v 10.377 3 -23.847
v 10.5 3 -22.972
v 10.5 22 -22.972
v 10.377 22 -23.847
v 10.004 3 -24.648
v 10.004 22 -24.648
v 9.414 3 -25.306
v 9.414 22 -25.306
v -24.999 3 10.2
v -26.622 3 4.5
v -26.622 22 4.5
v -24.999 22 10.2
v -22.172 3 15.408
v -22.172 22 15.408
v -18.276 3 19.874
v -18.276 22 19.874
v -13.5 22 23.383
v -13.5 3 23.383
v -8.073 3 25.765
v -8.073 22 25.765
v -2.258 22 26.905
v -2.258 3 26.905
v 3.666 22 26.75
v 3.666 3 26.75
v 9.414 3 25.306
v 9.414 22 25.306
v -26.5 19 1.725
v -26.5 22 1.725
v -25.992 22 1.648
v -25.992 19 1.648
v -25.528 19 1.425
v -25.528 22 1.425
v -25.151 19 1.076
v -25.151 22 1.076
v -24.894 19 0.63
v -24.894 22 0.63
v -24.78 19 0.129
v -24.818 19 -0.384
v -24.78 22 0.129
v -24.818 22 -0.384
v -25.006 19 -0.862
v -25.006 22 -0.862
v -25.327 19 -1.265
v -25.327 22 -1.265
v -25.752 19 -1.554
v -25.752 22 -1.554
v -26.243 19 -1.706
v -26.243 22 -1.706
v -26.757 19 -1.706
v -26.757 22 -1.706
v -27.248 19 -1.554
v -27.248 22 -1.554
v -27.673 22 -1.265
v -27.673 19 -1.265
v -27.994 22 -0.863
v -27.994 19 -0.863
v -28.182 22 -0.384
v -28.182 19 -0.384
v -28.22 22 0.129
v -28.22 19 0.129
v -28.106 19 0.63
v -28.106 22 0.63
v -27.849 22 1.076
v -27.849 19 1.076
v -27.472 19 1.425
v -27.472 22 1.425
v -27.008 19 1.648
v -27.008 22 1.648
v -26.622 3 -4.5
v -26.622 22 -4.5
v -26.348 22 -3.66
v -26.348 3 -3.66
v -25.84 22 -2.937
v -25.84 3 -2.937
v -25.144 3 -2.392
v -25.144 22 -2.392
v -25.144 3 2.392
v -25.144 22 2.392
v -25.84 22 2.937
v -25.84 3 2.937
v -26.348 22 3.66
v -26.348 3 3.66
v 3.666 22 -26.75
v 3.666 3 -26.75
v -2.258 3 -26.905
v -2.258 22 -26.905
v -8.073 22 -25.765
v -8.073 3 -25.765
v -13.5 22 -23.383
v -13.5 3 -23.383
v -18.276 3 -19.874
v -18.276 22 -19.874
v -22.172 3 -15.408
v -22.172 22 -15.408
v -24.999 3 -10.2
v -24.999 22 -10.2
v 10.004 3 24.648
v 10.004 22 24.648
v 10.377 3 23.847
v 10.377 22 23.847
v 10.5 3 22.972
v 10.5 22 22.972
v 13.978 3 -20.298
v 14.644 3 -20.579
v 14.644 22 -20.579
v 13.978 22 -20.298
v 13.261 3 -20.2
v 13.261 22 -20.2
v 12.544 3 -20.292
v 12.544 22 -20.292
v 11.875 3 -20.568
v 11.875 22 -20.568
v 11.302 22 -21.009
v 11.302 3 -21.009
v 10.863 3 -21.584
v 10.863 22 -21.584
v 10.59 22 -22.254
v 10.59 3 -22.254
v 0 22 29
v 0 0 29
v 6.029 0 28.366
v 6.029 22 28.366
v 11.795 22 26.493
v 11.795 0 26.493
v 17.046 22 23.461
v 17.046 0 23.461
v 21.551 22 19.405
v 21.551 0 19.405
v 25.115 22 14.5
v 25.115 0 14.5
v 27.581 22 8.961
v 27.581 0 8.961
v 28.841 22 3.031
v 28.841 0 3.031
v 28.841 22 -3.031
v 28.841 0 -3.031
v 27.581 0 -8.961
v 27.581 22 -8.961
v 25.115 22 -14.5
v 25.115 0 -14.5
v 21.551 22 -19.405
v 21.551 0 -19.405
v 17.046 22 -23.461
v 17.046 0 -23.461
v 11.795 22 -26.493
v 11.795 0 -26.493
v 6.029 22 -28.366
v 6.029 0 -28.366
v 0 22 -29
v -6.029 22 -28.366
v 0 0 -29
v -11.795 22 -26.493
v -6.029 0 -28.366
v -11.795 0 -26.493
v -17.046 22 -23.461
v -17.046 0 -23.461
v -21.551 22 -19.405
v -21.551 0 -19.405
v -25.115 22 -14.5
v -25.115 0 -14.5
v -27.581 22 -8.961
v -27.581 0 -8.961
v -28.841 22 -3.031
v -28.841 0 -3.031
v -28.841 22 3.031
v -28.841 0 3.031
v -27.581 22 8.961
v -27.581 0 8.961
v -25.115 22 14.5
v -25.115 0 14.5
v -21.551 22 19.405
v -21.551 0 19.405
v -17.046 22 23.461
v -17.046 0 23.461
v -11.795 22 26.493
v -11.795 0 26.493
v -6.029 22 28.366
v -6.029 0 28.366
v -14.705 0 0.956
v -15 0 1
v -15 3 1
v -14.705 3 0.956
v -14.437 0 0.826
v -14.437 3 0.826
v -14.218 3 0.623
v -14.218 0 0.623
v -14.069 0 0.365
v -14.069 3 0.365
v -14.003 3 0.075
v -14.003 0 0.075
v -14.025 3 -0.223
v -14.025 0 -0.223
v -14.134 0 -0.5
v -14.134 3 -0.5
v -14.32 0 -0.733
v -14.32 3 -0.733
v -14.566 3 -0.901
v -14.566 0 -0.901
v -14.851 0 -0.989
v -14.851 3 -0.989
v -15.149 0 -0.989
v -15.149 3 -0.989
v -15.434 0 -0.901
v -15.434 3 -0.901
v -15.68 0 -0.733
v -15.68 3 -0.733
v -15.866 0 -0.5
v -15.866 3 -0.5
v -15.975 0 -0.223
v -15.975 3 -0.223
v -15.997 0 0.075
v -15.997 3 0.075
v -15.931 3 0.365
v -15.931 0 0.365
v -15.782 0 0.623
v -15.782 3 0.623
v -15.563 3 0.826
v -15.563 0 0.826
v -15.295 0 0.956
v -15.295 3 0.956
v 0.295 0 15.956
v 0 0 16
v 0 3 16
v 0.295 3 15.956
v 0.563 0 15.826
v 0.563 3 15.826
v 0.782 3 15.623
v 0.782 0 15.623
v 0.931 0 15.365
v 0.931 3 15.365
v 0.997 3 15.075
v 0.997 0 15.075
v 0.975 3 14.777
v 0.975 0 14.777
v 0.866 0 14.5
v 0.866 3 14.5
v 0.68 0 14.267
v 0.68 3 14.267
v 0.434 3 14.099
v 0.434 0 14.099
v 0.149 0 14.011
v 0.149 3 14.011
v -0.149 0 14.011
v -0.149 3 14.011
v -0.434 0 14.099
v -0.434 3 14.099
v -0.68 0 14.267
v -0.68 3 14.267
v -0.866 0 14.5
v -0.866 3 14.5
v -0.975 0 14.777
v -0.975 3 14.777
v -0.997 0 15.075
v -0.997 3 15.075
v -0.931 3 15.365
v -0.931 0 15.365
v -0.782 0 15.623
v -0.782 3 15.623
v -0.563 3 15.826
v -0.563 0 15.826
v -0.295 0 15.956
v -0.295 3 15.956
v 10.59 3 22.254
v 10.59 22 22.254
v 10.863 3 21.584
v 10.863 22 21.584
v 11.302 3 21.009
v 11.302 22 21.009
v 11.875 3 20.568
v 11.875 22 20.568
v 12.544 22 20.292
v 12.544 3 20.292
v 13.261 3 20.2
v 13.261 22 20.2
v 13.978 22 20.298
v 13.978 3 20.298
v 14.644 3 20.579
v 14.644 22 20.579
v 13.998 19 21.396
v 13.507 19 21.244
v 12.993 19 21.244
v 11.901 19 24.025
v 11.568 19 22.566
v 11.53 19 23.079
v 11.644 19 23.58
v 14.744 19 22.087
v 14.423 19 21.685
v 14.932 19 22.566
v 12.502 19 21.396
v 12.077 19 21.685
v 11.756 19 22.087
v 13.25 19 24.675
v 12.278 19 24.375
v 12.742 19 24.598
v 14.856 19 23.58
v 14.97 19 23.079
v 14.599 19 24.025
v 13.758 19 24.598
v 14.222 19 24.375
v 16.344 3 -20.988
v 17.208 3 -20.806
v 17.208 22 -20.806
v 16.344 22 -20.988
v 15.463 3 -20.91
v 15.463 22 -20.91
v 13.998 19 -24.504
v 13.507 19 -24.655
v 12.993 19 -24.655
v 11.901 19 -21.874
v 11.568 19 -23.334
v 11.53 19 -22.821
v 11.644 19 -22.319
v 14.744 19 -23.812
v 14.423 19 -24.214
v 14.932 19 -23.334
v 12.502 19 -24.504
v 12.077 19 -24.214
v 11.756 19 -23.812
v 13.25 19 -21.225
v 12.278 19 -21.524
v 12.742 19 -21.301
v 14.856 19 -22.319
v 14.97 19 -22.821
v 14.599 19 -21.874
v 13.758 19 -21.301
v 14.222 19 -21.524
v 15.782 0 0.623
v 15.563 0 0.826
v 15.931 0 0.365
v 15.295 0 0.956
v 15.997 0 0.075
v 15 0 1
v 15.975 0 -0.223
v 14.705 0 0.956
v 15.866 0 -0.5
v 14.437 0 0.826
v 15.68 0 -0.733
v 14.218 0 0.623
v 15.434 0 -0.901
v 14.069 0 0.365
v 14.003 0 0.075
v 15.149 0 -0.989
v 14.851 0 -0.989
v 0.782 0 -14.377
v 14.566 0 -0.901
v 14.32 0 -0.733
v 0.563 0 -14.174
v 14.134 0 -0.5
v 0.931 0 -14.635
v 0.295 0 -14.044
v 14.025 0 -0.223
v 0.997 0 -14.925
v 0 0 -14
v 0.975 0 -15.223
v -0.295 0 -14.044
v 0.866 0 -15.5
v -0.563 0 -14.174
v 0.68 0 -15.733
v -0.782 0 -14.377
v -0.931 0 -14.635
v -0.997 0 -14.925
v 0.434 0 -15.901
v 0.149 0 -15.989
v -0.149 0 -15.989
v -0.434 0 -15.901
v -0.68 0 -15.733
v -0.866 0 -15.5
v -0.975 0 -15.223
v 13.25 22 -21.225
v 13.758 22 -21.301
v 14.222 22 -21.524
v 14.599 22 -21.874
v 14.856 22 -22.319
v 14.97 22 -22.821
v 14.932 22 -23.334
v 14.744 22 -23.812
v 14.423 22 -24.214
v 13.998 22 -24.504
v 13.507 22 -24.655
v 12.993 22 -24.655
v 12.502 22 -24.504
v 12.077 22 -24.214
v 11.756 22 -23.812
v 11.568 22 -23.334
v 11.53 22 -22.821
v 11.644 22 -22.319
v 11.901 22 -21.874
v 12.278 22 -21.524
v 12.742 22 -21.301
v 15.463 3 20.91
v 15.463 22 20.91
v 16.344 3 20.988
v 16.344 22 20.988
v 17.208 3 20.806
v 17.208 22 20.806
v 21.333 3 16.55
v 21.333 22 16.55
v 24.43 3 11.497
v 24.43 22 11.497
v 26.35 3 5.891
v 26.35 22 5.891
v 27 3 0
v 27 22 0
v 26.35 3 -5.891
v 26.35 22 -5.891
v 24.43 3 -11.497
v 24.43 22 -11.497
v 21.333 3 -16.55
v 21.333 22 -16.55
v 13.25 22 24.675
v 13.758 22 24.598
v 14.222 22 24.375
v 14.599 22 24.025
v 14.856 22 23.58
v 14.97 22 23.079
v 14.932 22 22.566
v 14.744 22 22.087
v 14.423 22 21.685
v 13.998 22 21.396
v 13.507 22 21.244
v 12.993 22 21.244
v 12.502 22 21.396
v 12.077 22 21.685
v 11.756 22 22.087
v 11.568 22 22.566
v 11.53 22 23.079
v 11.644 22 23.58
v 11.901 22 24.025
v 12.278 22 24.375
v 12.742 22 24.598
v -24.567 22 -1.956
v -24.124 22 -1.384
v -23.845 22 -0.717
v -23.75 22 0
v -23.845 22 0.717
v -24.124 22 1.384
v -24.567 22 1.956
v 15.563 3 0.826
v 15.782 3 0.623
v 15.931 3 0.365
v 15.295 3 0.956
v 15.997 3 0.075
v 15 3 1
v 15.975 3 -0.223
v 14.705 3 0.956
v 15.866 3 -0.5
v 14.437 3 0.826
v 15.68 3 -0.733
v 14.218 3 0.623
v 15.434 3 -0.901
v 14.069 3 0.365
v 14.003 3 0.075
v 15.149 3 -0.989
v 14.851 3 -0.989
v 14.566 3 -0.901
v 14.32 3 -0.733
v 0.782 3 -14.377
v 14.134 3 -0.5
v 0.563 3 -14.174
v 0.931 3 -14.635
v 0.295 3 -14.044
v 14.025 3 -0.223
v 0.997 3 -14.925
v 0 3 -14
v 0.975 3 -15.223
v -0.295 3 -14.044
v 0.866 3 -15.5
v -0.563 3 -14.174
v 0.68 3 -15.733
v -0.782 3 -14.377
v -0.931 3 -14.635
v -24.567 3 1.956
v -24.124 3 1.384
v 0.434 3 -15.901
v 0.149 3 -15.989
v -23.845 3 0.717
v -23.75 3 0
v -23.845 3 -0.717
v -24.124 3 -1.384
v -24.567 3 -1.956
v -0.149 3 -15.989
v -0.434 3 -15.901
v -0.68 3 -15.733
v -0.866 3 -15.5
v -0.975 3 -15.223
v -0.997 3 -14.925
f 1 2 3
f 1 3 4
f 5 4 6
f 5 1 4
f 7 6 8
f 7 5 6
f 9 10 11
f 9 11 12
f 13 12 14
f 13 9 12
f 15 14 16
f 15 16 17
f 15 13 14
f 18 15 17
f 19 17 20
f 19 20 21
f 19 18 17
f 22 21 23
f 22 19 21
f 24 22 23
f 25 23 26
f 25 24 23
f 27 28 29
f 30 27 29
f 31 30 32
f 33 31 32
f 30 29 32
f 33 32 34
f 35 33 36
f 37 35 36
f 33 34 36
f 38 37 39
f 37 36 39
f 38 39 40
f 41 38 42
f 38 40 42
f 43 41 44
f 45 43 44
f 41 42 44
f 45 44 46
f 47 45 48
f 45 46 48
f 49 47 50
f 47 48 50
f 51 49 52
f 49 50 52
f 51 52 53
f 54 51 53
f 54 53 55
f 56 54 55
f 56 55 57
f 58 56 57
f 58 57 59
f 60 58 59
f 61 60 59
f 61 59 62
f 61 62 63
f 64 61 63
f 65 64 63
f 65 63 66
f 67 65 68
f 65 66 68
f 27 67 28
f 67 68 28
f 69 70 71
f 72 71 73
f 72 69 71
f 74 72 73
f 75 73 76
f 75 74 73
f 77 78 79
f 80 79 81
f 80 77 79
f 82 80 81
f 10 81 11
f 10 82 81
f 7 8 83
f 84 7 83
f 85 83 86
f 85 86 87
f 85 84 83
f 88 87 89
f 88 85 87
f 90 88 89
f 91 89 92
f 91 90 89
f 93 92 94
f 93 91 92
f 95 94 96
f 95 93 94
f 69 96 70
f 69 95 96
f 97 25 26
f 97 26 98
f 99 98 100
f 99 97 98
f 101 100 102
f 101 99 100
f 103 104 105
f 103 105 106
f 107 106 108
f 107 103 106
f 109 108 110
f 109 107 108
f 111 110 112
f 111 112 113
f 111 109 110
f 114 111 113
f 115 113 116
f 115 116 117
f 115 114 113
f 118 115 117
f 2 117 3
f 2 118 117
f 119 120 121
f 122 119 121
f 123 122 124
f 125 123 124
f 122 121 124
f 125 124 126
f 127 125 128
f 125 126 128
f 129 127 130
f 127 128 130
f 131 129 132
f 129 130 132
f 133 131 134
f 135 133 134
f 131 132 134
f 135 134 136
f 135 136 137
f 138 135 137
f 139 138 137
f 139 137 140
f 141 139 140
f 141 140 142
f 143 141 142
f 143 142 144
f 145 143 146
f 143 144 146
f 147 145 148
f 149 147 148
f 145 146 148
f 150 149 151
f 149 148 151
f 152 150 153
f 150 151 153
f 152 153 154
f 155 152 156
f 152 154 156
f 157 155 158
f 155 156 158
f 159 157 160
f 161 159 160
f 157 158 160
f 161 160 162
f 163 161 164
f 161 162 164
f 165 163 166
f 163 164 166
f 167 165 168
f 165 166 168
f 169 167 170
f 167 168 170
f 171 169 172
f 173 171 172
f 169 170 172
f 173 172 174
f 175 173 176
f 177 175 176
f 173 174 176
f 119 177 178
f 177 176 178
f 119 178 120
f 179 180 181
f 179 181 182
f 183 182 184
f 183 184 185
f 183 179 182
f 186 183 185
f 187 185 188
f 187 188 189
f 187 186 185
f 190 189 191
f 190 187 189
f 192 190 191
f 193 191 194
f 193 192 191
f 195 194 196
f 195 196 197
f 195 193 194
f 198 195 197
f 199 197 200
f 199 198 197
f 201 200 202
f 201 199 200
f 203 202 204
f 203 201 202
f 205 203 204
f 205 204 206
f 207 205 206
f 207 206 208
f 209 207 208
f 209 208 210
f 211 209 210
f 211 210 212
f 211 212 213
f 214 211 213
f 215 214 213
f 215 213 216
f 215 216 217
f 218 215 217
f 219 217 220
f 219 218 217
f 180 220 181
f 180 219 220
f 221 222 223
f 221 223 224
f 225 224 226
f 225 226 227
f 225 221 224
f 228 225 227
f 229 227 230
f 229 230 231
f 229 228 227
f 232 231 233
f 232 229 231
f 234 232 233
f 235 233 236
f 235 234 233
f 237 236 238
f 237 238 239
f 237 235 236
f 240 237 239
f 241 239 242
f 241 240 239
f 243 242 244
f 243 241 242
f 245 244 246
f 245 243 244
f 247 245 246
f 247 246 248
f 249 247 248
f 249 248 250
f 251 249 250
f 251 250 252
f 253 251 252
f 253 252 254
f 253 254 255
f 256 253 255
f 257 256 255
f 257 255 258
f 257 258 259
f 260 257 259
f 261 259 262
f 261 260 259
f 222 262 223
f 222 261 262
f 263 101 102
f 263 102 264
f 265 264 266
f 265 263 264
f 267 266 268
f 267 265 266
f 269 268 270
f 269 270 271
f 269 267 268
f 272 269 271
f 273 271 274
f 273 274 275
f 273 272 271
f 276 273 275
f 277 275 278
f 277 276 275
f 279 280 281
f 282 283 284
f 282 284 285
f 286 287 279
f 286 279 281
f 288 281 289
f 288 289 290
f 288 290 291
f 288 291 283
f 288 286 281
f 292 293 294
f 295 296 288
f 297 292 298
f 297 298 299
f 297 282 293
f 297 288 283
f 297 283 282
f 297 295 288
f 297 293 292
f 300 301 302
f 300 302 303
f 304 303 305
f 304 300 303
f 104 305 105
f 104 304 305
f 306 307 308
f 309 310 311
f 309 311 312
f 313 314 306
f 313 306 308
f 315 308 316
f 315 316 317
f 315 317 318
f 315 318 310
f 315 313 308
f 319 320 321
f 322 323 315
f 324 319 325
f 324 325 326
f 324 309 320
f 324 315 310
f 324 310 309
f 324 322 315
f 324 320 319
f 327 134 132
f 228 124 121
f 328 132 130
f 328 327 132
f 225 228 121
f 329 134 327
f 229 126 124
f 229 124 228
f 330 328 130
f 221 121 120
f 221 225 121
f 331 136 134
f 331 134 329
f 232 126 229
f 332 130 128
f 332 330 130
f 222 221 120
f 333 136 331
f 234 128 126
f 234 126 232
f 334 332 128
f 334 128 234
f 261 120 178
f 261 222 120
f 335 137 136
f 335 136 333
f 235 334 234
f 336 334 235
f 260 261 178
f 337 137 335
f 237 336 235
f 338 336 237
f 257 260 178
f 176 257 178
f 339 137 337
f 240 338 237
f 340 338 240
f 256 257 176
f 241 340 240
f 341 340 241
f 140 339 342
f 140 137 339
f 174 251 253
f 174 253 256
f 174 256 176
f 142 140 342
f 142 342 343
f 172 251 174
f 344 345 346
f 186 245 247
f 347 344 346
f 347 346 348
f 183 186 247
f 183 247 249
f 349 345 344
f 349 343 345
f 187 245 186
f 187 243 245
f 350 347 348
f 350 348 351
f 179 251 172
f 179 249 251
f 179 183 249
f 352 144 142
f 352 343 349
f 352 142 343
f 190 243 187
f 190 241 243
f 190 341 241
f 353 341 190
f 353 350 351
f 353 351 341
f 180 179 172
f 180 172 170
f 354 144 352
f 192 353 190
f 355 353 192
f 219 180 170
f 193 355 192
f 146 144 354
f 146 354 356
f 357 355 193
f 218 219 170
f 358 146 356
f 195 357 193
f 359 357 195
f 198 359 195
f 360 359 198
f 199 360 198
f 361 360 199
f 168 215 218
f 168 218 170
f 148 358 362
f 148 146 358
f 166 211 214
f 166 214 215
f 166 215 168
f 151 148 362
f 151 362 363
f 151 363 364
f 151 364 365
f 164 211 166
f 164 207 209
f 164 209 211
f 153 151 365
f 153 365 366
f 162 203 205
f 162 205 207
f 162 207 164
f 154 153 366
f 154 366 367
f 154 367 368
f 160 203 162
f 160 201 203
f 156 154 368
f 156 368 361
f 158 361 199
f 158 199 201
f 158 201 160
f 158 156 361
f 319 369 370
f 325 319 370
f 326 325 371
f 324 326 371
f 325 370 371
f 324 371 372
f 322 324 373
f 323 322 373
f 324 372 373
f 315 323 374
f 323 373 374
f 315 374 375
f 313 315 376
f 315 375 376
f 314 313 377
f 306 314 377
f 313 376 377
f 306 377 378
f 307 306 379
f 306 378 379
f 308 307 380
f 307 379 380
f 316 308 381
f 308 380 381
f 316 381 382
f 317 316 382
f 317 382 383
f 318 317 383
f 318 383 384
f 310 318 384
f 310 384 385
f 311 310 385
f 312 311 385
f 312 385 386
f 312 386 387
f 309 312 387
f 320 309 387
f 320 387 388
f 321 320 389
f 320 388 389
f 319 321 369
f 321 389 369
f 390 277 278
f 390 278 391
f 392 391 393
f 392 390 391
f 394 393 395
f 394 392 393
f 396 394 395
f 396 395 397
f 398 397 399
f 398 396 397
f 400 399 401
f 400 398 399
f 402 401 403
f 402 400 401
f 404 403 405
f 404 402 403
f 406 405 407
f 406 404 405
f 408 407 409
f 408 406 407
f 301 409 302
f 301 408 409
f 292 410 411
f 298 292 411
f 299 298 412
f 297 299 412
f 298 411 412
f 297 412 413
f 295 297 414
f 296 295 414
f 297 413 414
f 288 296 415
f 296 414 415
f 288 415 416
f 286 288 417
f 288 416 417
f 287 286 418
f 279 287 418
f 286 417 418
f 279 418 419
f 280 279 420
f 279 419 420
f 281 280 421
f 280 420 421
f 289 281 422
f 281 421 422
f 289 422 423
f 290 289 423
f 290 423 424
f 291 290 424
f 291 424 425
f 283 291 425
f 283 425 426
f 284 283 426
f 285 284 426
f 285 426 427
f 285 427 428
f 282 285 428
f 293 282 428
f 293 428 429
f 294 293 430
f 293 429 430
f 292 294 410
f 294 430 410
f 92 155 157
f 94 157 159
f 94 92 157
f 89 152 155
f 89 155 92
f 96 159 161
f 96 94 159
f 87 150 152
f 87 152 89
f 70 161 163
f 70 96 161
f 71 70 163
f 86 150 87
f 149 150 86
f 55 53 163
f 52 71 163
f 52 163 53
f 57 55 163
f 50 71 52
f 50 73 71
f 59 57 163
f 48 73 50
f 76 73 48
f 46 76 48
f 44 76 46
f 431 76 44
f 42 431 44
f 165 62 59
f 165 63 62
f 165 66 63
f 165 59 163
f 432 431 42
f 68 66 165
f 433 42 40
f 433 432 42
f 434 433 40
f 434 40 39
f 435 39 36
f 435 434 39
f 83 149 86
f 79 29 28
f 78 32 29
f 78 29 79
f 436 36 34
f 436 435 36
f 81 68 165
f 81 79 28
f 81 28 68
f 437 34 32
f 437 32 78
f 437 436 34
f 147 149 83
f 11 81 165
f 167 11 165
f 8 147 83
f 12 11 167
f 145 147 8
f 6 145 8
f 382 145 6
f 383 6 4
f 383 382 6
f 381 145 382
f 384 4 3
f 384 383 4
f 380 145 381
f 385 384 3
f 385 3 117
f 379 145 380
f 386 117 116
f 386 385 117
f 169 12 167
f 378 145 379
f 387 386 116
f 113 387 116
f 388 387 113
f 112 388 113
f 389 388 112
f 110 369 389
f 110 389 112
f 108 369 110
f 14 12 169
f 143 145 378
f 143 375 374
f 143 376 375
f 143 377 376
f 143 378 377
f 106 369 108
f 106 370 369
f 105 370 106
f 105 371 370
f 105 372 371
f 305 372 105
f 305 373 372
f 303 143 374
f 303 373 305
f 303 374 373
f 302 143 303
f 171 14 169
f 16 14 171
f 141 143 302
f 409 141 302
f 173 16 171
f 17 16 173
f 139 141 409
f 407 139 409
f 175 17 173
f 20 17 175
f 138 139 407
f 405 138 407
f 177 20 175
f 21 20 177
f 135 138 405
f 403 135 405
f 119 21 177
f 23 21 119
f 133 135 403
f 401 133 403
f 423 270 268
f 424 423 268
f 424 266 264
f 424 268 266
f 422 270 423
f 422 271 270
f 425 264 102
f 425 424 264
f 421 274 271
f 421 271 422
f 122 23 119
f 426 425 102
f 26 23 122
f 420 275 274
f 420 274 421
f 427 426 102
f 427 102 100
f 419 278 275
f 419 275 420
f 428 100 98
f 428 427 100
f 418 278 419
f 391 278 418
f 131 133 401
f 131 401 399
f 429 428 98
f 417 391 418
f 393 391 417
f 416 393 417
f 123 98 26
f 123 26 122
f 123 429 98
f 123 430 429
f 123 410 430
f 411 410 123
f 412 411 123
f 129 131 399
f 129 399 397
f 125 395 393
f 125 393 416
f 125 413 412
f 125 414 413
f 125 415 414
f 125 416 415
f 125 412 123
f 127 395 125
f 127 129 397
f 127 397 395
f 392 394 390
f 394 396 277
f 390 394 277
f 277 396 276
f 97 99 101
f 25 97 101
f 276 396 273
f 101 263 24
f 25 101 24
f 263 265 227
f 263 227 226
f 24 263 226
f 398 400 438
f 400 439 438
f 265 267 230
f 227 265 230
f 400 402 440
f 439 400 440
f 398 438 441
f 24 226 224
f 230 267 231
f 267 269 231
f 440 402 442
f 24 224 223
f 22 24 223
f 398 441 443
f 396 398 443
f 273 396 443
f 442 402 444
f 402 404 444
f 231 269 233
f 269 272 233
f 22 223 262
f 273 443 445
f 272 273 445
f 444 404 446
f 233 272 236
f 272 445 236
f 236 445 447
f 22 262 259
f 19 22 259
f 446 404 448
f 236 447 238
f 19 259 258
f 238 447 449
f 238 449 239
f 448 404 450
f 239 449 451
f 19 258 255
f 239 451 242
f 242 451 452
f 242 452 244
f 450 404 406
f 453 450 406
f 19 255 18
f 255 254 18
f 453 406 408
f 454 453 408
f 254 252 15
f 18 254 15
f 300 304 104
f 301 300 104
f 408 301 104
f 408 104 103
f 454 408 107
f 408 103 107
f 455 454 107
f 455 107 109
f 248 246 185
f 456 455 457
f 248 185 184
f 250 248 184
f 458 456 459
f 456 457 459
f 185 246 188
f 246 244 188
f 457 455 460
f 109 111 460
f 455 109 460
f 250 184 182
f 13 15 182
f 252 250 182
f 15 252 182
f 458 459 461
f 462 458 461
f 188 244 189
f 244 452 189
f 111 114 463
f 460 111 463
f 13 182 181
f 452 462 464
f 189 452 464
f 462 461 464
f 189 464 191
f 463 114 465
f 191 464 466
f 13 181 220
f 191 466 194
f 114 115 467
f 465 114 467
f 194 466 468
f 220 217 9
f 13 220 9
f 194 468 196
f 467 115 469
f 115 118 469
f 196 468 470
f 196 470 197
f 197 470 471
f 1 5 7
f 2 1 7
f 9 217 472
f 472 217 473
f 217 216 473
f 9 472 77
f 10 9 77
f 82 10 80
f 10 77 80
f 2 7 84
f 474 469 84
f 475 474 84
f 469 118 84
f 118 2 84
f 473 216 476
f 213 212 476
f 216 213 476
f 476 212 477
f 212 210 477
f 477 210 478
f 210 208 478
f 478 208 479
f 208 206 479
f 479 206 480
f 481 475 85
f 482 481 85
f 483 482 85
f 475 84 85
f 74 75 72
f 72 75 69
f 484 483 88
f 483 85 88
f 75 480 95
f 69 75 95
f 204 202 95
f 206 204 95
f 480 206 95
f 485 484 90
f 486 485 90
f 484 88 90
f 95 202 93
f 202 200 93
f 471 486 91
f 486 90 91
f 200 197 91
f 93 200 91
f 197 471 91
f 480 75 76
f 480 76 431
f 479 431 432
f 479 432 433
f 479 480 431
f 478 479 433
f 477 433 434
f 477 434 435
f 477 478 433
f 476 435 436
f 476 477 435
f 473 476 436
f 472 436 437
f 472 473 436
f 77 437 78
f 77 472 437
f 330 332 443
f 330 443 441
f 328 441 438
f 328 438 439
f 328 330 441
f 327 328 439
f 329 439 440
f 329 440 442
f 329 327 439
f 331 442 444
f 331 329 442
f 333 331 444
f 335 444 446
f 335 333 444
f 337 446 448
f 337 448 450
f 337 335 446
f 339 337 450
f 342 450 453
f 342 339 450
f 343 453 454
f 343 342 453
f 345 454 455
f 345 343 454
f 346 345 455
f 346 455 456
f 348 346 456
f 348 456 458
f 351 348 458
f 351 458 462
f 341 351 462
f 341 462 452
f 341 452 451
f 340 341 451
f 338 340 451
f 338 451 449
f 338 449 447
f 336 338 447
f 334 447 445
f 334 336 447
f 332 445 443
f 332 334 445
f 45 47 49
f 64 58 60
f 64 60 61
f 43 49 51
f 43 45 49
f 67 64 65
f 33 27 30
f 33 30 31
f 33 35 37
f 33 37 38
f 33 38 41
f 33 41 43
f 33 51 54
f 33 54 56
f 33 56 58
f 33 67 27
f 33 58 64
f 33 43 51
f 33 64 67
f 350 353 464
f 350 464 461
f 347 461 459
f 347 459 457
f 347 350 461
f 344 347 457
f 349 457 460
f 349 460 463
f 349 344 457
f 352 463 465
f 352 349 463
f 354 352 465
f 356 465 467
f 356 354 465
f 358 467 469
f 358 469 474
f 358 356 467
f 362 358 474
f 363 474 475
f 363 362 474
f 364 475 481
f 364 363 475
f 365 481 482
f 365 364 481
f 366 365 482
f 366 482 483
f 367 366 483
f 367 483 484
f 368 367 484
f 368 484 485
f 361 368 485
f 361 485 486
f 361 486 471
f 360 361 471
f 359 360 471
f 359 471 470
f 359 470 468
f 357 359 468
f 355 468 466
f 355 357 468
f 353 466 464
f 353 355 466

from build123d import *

# Parameters (mm, degrees)
SKETCH1_R           = 29
BOSS_EXTRUDE1_DEPTH = 22
SKETCH1_5_R         = 1
BOSS_EXTRUDE2_DEPTH = 3
CUT_EXTRUDE1_START  = 22
SKETCH1_6_R         = 1.725
CUT_EXTRUDE1_DEPTH  = 3


with BuildPart() as part:
    # Sketch1 → Boss-Extrude1 (new body)
    with BuildSketch(Plane(origin=(0, 0, 0), x_dir=(1, 0, 0), z_dir=(0, 1, 0))):
        with Locations(Location((0, 0, 0), (0, 0, 270))):
            Circle(SKETCH1_R)
        with BuildLine():
            ThreePointArc((9.414065195, 25.305639223), (-13.5, 23.382685902), (-26.622359024, 4.5))
            ThreePointArc((-26.622359024, 4.5), (-26.120735258, 3.279582529), (-25.143996734, 2.392437072))
            ThreePointArc((-25.143996734, 2.392437072), (-23.75, 0), (-25.143996734, -2.392437072))
            ThreePointArc((-25.143996734, -2.392437072), (-26.120735258, -3.279582529), (-26.622359024, -4.5))
            ThreePointArc((-26.622359024, -4.5), (-13.5, -23.382685902), (9.414065195, -25.305639223))
            ThreePointArc((9.414065195, -25.305639223), (10.220165845, -24.261011563), (10.500087086, -22.971558461))
            ThreePointArc((10.500087086, -22.971558461), (11.875, -20.56810334), (14.643909648, -20.579121389))
            ThreePointArc((14.643909648, -20.579121389), (15.900569413, -20.981429034), (17.208293829, -20.805639223))
            ThreePointArc((17.208293829, -20.805639223), (27, 0), (17.208293829, 20.805639223))
            ThreePointArc((17.208293829, 20.805639223), (15.900569413, 20.981429034), (14.643909648, 20.579121389))
            ThreePointArc((14.643909648, 20.579121389), (11.875, 20.56810334), (10.500087086, 22.971558461))
            ThreePointArc((10.500087086, 22.971558461), (10.220165845, 24.261011563), (9.414065195, 25.305639223))
        make_face(mode=Mode.SUBTRACT)
    extrude(amount=BOSS_EXTRUDE1_DEPTH)

    # Sketch1<5> → Boss-Extrude2 (add)
    with BuildSketch(Plane(origin=(0, 0, 0), x_dir=(1, 0, 0), z_dir=(0, 1, 0))):
        with BuildLine():
            ThreePointArc((-26.622359024, -4.5), (-26.120735258, -3.279582529), (-25.143996734, -2.392437072))
            ThreePointArc((-25.143996734, -2.392437072), (-23.75, 0), (-25.143996734, 2.392437072))
            ThreePointArc((-25.143996734, 2.392437072), (-26.120735258, 3.279582529), (-26.622359024, 4.5))
            ThreePointArc((-26.622359024, 4.5), (-13.5, 23.382685902), (9.414065195, 25.305639223))
            ThreePointArc((9.414065195, 25.305639223), (10.220165845, 24.261011563), (10.500087086, 22.971558461))
            ThreePointArc((10.500087086, 22.971558461), (11.875, 20.56810334), (14.643909648, 20.579121389))
            ThreePointArc((14.643909648, 20.579121389), (15.900569413, 20.981429034), (17.208293829, 20.805639223))
            ThreePointArc((17.208293829, 20.805639223), (27, 0), (17.208293829, -20.805639223))
            ThreePointArc((17.208293829, -20.805639223), (15.900569413, -20.981429034), (14.643909648, -20.579121389))
            ThreePointArc((14.643909648, -20.579121389), (11.875, -20.56810334), (10.500087086, -22.971558461))
            ThreePointArc((10.500087086, -22.971558461), (10.220165845, -24.261011563), (9.414065195, -25.305639223))
            ThreePointArc((9.414065195, -25.305639223), (-13.5, -23.382685902), (-26.622359024, -4.5))
        make_face()
        with Locations(Location((0, 15, 0), (0, 0, 270))):
            Circle(SKETCH1_5_R, mode=Mode.SUBTRACT)
        with Locations(Location((15, 0, 0), (0, 0, 270))):
            Circle(SKETCH1_5_R, mode=Mode.SUBTRACT)
        with Locations(Location((0, -15, 0), (0, 0, 270))):
            Circle(SKETCH1_5_R, mode=Mode.SUBTRACT)
        with Locations(Location((-15, 0, 0), (0, 0, 270))):
            Circle(SKETCH1_5_R, mode=Mode.SUBTRACT)
    extrude(amount=BOSS_EXTRUDE2_DEPTH)

    # Sketch1<6> → Cut-Extrude1 (cut)
    with BuildSketch(Plane(origin=(0, 0, 0), x_dir=(1, 0, 0), z_dir=(0, 1, 0)).offset(CUT_EXTRUDE1_START)):
        with Locations(Location((13.25, 22.9496732, 0), (0, 0, 270))):
            Circle(SKETCH1_6_R)
        with Locations(Location((13.25, -22.9496732, 0), (0, 0, 270))):
            Circle(SKETCH1_6_R)
        with Locations(Location((-26.5, 0, 0), (0, 0, 270))):
            Circle(SKETCH1_6_R)
    extrude(amount=-CUT_EXTRUDE1_DEPTH, mode=Mode.SUBTRACT)


solid = part.part
